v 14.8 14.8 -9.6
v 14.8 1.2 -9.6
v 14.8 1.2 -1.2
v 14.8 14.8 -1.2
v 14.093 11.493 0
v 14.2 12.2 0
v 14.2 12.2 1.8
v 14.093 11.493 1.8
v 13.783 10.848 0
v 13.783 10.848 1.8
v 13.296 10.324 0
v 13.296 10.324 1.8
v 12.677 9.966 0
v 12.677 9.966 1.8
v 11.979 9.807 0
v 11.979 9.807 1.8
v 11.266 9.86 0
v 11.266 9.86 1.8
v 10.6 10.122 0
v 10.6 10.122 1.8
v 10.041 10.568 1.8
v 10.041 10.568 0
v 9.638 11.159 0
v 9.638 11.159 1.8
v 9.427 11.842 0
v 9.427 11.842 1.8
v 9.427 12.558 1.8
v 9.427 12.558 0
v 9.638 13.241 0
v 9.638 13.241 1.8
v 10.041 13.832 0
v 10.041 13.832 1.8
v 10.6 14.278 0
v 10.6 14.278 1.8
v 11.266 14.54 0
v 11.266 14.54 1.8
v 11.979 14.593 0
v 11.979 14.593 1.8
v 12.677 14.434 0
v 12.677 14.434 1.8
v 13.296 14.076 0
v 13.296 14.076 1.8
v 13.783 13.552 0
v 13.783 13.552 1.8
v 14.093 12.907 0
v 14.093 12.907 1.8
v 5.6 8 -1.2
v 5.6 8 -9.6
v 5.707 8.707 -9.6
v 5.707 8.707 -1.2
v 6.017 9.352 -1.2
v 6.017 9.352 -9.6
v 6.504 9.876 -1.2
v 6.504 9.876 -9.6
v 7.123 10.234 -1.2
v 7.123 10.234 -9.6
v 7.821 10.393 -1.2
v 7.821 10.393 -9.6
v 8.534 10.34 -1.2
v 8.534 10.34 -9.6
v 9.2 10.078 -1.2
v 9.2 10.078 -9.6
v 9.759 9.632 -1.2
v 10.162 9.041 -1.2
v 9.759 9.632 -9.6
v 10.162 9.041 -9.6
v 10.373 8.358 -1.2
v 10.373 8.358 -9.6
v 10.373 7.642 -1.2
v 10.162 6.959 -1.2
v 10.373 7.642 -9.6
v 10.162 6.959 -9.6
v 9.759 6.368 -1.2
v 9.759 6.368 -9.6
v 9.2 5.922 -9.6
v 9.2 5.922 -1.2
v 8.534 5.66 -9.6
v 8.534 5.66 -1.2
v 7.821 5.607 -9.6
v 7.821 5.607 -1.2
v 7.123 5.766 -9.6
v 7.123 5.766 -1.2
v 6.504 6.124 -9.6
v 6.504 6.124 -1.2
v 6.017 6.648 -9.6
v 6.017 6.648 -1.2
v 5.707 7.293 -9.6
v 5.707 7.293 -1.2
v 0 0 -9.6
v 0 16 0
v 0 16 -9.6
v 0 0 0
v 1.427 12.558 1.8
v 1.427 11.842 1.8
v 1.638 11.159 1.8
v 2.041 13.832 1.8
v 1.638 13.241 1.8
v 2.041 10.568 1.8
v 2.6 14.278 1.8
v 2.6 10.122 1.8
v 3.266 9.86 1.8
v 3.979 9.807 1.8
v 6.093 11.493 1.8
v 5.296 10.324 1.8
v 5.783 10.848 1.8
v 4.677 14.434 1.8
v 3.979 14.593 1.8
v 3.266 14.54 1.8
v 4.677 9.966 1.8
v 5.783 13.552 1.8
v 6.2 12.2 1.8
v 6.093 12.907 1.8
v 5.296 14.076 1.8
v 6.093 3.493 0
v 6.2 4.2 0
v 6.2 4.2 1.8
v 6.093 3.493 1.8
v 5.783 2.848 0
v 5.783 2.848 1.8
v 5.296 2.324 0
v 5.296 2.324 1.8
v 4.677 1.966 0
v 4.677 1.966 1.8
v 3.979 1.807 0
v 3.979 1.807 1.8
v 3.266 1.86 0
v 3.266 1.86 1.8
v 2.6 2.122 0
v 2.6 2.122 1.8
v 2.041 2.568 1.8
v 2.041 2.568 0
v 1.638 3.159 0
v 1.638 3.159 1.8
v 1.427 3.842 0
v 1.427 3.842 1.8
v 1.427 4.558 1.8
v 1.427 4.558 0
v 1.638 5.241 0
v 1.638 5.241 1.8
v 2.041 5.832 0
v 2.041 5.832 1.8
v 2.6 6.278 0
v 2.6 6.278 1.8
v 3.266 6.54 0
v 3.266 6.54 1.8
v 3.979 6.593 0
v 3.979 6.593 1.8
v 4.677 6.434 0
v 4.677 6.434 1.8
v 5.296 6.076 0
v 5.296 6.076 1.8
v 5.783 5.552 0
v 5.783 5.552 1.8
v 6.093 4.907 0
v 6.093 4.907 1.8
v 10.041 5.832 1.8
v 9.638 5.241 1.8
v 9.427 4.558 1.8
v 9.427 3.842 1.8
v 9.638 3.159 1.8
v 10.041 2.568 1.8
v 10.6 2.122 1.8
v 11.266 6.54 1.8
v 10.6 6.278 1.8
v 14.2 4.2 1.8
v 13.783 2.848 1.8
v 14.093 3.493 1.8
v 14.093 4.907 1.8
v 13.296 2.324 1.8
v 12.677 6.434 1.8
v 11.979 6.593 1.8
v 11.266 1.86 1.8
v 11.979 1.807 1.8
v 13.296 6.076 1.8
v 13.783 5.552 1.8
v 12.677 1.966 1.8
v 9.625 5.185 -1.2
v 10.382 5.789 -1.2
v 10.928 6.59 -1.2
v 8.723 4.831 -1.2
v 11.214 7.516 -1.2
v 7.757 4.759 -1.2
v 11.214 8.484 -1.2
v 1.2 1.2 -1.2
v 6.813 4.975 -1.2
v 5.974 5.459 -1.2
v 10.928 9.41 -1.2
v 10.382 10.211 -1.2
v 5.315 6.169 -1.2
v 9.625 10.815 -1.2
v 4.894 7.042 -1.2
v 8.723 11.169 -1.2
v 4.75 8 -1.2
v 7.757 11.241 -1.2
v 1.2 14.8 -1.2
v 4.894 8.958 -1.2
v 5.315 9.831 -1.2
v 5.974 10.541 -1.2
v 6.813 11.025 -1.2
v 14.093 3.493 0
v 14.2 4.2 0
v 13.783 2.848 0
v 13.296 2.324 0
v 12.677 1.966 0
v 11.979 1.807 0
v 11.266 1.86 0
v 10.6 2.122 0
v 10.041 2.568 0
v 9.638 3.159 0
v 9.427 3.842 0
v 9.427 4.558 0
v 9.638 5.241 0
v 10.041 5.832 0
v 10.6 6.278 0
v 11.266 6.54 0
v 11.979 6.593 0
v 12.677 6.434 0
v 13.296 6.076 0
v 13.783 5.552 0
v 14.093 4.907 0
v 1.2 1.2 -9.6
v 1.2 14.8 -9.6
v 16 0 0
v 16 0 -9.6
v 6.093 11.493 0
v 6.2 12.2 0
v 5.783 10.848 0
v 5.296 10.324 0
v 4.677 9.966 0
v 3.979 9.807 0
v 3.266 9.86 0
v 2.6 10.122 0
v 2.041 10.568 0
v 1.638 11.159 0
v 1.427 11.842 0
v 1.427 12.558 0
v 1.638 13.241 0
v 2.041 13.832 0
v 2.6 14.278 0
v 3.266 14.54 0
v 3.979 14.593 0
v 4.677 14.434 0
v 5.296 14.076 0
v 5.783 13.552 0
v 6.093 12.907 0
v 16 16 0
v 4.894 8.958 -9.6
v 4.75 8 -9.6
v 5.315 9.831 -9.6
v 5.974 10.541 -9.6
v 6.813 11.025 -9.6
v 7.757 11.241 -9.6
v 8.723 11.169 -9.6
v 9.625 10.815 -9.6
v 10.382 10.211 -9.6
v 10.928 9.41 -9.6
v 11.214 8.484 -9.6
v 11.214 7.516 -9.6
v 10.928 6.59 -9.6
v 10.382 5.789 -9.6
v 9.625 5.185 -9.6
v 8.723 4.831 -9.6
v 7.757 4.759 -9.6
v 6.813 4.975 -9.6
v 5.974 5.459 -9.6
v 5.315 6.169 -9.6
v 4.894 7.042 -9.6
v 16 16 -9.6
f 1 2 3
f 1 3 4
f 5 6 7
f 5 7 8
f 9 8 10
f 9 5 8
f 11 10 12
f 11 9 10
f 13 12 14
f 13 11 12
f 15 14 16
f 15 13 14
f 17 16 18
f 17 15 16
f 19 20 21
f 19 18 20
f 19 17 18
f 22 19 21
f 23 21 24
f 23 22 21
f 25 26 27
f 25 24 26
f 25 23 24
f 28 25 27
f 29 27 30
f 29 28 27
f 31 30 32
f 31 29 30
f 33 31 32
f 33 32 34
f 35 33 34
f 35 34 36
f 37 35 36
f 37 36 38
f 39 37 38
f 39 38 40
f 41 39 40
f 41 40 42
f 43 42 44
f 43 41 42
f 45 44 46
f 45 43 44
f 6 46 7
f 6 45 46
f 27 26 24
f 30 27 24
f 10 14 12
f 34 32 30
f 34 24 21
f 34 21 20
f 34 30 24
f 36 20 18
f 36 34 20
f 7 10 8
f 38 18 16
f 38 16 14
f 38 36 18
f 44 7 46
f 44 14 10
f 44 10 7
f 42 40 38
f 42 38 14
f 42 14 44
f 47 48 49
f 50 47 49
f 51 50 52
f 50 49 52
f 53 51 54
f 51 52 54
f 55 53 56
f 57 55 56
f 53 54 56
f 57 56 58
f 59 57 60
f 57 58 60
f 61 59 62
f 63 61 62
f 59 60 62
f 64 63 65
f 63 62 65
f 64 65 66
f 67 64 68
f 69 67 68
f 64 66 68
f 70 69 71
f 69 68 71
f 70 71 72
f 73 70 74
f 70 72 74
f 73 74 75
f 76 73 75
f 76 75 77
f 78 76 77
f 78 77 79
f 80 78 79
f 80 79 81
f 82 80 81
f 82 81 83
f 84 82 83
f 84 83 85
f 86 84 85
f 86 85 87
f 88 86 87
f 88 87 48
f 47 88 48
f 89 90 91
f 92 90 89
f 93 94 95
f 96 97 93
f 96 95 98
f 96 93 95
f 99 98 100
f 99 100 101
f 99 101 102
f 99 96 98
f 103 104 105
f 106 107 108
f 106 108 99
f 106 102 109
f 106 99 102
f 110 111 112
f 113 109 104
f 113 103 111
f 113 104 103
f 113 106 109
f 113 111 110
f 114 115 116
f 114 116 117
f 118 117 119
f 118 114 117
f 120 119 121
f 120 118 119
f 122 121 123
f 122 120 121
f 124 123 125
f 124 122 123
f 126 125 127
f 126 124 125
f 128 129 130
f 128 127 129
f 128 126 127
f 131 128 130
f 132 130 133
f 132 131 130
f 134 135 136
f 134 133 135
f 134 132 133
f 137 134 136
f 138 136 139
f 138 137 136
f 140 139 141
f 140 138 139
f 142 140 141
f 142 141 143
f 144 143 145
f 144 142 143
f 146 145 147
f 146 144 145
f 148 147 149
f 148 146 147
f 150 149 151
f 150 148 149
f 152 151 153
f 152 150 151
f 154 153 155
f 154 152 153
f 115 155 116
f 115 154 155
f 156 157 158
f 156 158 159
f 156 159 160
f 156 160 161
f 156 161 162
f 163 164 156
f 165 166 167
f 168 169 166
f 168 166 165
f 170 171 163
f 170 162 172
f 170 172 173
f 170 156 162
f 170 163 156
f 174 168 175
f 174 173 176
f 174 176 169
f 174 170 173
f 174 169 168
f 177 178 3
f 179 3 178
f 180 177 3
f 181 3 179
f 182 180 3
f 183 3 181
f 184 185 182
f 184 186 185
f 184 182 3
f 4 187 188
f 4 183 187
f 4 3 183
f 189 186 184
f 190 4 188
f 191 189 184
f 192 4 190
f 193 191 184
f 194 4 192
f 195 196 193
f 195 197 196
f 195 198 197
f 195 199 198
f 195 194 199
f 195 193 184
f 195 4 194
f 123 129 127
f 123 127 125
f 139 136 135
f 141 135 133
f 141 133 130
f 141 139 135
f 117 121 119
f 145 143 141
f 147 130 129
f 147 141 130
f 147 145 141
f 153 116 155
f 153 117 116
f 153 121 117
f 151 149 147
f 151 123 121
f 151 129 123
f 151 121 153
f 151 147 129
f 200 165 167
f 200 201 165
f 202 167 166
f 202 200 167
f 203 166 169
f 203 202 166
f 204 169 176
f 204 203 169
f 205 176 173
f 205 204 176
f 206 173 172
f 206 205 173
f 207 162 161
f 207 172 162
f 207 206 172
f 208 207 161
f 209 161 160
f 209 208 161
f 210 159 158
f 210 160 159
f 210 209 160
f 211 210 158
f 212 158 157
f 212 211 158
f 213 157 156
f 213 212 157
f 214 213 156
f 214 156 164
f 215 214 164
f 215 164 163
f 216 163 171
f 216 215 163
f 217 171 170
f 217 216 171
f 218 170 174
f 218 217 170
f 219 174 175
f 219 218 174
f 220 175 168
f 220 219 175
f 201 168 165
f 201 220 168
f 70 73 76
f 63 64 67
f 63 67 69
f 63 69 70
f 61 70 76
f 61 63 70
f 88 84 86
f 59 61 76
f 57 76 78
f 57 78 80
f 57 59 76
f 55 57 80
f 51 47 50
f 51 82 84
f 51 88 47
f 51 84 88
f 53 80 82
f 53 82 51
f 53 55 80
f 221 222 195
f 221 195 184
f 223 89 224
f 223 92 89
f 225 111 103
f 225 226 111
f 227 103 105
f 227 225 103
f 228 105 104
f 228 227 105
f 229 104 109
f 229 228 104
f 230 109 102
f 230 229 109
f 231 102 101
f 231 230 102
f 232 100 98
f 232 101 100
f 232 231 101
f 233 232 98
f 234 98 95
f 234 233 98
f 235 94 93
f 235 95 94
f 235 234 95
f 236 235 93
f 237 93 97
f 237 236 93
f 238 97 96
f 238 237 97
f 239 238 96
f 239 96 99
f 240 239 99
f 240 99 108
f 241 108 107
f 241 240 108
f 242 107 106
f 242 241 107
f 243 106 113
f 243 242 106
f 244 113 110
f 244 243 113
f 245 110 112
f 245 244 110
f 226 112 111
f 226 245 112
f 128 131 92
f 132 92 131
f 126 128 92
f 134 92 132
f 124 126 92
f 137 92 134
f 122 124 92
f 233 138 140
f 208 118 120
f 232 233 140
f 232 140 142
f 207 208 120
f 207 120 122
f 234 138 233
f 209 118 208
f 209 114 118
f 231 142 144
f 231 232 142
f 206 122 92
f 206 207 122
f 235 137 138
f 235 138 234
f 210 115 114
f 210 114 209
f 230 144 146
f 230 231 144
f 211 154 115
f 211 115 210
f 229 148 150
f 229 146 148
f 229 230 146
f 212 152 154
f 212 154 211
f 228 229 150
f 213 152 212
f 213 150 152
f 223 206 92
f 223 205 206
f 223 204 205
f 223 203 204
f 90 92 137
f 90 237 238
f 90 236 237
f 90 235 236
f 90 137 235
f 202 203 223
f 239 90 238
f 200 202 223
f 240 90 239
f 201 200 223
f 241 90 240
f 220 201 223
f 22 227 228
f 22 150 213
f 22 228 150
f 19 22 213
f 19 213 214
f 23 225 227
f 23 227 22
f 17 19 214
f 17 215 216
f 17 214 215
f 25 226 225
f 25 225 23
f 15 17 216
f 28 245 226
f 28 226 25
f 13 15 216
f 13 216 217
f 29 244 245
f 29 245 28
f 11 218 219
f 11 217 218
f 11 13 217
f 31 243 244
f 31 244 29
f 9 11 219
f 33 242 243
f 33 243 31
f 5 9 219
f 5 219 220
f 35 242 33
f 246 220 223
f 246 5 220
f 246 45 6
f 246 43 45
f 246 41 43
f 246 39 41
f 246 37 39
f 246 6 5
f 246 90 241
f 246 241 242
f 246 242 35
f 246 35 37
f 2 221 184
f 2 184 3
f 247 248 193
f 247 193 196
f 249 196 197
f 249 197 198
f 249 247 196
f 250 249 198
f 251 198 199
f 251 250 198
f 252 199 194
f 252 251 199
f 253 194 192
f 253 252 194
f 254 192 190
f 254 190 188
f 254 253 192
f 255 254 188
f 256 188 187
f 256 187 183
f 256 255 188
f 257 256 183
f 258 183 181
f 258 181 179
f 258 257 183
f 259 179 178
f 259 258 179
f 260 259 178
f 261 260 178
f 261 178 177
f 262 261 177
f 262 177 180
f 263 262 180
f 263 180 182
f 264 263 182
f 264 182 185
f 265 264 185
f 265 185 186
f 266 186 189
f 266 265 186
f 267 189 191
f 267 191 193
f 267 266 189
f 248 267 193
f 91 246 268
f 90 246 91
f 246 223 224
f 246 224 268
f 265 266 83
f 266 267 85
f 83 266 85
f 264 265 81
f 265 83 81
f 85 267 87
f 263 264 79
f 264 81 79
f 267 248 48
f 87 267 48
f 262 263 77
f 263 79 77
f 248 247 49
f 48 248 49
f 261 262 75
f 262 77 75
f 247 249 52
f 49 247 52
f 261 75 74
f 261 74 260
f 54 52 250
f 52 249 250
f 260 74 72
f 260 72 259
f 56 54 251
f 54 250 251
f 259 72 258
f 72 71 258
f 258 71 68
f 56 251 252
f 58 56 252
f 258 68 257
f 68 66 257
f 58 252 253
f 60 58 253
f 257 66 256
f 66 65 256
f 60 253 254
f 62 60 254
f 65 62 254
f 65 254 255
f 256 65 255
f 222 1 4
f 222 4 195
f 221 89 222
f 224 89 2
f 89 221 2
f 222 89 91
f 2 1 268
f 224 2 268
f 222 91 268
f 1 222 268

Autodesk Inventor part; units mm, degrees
ref_plane "YZ Plane" through (0, 0, 0) normal (1, 0, 0) x (0, 1, 0)
ref_plane "XZ Plane" through (0, 0, 0) normal (0, 1, 0) x (-1, 0, 0)
ref_plane "XY Plane" through (0, 0, 0) normal (0, 0, 1) x (1, 0, 0)
sketch "Sketch1" plane through (0, 0, 0) normal (0, 0, 1) x (1, 0, 0)
  line L0 (0, 0) -> (16, 0)
  line L1 (16, 0) -> (16, 16)
  line L2 (16, 16) -> (0, 16)
  line L3 (0, 16) -> (0, 0)
  dimension "d0" = 16
  dimension "d1" = 16
extrude "Extrusion1" add sketch "Sketch1" against normal blind 9.6
sketch "Sketch2" plane through (0, 0, 0) normal (0, 0, 1) x (1, 0, 0)
  circle A0 centre (3.8, 12.2) radius 2.4
  line L0 (0, 16) -> (0, 0) projected
  line L1 (16, 16) -> (0, 16) projected
  circle A1 centre (11.8, 12.2) radius 2.4
  circle A2 centre (3.8, 4.2) radius 2.4
  circle A3 centre (11.8, 4.2) radius 2.4
  dimension "d4" = 4.8
  dimension "d5" = 3.8
  dimension "d6" = 3.8
  dimension "d7" = 4.8
  dimension "d8" = 8
  dimension "d9" = 4.8
  dimension "d10" = 4.8
  dimension "d11" = 8
extrude "Extrusion2" add sketch "Sketch2" along normal blind 1.8
sketch "Sketch3" plane through (0, 0, -9.6) normal (0, 0, -1) x (-1, 0, 0)
  line L0 (-14.8, 14.8) -> (-1.2, 14.8)
  line L1 (-1.2, 14.8) -> (-1.2, 1.2)
  line L2 (-1.2, 1.2) -> (-14.8, 1.2)
  line L3 (-14.8, 1.2) -> (-14.8, 14.8)
  line L4 (0, 16) -> (-16, 16) projected
  line L5 (-16, 16) -> (-16, 0) projected
  line L6 (-16, 0) -> (0, 0) projected
  line L7 (0, 16) -> (0, 0) projected
  circle A0 centre (-8, 8) radius 3.25
  circle A1 centre (-8, 8) radius 2.4
  dimension "d14" = 1.2
  dimension "d15" = 1.2
  dimension "d16" = 1.2
  dimension "d17" = 1.2
  dimension "d18" = 6.5
  dimension "d19" = 8
  dimension "d20" = 8
  dimension "d21" = 4.8
extrude "Extrusion3" cut sketch "Sketch3" against normal blind 8.4 contours L0 L1 L2 L3 | A1
properties part number "Yee_2x2Brick"
